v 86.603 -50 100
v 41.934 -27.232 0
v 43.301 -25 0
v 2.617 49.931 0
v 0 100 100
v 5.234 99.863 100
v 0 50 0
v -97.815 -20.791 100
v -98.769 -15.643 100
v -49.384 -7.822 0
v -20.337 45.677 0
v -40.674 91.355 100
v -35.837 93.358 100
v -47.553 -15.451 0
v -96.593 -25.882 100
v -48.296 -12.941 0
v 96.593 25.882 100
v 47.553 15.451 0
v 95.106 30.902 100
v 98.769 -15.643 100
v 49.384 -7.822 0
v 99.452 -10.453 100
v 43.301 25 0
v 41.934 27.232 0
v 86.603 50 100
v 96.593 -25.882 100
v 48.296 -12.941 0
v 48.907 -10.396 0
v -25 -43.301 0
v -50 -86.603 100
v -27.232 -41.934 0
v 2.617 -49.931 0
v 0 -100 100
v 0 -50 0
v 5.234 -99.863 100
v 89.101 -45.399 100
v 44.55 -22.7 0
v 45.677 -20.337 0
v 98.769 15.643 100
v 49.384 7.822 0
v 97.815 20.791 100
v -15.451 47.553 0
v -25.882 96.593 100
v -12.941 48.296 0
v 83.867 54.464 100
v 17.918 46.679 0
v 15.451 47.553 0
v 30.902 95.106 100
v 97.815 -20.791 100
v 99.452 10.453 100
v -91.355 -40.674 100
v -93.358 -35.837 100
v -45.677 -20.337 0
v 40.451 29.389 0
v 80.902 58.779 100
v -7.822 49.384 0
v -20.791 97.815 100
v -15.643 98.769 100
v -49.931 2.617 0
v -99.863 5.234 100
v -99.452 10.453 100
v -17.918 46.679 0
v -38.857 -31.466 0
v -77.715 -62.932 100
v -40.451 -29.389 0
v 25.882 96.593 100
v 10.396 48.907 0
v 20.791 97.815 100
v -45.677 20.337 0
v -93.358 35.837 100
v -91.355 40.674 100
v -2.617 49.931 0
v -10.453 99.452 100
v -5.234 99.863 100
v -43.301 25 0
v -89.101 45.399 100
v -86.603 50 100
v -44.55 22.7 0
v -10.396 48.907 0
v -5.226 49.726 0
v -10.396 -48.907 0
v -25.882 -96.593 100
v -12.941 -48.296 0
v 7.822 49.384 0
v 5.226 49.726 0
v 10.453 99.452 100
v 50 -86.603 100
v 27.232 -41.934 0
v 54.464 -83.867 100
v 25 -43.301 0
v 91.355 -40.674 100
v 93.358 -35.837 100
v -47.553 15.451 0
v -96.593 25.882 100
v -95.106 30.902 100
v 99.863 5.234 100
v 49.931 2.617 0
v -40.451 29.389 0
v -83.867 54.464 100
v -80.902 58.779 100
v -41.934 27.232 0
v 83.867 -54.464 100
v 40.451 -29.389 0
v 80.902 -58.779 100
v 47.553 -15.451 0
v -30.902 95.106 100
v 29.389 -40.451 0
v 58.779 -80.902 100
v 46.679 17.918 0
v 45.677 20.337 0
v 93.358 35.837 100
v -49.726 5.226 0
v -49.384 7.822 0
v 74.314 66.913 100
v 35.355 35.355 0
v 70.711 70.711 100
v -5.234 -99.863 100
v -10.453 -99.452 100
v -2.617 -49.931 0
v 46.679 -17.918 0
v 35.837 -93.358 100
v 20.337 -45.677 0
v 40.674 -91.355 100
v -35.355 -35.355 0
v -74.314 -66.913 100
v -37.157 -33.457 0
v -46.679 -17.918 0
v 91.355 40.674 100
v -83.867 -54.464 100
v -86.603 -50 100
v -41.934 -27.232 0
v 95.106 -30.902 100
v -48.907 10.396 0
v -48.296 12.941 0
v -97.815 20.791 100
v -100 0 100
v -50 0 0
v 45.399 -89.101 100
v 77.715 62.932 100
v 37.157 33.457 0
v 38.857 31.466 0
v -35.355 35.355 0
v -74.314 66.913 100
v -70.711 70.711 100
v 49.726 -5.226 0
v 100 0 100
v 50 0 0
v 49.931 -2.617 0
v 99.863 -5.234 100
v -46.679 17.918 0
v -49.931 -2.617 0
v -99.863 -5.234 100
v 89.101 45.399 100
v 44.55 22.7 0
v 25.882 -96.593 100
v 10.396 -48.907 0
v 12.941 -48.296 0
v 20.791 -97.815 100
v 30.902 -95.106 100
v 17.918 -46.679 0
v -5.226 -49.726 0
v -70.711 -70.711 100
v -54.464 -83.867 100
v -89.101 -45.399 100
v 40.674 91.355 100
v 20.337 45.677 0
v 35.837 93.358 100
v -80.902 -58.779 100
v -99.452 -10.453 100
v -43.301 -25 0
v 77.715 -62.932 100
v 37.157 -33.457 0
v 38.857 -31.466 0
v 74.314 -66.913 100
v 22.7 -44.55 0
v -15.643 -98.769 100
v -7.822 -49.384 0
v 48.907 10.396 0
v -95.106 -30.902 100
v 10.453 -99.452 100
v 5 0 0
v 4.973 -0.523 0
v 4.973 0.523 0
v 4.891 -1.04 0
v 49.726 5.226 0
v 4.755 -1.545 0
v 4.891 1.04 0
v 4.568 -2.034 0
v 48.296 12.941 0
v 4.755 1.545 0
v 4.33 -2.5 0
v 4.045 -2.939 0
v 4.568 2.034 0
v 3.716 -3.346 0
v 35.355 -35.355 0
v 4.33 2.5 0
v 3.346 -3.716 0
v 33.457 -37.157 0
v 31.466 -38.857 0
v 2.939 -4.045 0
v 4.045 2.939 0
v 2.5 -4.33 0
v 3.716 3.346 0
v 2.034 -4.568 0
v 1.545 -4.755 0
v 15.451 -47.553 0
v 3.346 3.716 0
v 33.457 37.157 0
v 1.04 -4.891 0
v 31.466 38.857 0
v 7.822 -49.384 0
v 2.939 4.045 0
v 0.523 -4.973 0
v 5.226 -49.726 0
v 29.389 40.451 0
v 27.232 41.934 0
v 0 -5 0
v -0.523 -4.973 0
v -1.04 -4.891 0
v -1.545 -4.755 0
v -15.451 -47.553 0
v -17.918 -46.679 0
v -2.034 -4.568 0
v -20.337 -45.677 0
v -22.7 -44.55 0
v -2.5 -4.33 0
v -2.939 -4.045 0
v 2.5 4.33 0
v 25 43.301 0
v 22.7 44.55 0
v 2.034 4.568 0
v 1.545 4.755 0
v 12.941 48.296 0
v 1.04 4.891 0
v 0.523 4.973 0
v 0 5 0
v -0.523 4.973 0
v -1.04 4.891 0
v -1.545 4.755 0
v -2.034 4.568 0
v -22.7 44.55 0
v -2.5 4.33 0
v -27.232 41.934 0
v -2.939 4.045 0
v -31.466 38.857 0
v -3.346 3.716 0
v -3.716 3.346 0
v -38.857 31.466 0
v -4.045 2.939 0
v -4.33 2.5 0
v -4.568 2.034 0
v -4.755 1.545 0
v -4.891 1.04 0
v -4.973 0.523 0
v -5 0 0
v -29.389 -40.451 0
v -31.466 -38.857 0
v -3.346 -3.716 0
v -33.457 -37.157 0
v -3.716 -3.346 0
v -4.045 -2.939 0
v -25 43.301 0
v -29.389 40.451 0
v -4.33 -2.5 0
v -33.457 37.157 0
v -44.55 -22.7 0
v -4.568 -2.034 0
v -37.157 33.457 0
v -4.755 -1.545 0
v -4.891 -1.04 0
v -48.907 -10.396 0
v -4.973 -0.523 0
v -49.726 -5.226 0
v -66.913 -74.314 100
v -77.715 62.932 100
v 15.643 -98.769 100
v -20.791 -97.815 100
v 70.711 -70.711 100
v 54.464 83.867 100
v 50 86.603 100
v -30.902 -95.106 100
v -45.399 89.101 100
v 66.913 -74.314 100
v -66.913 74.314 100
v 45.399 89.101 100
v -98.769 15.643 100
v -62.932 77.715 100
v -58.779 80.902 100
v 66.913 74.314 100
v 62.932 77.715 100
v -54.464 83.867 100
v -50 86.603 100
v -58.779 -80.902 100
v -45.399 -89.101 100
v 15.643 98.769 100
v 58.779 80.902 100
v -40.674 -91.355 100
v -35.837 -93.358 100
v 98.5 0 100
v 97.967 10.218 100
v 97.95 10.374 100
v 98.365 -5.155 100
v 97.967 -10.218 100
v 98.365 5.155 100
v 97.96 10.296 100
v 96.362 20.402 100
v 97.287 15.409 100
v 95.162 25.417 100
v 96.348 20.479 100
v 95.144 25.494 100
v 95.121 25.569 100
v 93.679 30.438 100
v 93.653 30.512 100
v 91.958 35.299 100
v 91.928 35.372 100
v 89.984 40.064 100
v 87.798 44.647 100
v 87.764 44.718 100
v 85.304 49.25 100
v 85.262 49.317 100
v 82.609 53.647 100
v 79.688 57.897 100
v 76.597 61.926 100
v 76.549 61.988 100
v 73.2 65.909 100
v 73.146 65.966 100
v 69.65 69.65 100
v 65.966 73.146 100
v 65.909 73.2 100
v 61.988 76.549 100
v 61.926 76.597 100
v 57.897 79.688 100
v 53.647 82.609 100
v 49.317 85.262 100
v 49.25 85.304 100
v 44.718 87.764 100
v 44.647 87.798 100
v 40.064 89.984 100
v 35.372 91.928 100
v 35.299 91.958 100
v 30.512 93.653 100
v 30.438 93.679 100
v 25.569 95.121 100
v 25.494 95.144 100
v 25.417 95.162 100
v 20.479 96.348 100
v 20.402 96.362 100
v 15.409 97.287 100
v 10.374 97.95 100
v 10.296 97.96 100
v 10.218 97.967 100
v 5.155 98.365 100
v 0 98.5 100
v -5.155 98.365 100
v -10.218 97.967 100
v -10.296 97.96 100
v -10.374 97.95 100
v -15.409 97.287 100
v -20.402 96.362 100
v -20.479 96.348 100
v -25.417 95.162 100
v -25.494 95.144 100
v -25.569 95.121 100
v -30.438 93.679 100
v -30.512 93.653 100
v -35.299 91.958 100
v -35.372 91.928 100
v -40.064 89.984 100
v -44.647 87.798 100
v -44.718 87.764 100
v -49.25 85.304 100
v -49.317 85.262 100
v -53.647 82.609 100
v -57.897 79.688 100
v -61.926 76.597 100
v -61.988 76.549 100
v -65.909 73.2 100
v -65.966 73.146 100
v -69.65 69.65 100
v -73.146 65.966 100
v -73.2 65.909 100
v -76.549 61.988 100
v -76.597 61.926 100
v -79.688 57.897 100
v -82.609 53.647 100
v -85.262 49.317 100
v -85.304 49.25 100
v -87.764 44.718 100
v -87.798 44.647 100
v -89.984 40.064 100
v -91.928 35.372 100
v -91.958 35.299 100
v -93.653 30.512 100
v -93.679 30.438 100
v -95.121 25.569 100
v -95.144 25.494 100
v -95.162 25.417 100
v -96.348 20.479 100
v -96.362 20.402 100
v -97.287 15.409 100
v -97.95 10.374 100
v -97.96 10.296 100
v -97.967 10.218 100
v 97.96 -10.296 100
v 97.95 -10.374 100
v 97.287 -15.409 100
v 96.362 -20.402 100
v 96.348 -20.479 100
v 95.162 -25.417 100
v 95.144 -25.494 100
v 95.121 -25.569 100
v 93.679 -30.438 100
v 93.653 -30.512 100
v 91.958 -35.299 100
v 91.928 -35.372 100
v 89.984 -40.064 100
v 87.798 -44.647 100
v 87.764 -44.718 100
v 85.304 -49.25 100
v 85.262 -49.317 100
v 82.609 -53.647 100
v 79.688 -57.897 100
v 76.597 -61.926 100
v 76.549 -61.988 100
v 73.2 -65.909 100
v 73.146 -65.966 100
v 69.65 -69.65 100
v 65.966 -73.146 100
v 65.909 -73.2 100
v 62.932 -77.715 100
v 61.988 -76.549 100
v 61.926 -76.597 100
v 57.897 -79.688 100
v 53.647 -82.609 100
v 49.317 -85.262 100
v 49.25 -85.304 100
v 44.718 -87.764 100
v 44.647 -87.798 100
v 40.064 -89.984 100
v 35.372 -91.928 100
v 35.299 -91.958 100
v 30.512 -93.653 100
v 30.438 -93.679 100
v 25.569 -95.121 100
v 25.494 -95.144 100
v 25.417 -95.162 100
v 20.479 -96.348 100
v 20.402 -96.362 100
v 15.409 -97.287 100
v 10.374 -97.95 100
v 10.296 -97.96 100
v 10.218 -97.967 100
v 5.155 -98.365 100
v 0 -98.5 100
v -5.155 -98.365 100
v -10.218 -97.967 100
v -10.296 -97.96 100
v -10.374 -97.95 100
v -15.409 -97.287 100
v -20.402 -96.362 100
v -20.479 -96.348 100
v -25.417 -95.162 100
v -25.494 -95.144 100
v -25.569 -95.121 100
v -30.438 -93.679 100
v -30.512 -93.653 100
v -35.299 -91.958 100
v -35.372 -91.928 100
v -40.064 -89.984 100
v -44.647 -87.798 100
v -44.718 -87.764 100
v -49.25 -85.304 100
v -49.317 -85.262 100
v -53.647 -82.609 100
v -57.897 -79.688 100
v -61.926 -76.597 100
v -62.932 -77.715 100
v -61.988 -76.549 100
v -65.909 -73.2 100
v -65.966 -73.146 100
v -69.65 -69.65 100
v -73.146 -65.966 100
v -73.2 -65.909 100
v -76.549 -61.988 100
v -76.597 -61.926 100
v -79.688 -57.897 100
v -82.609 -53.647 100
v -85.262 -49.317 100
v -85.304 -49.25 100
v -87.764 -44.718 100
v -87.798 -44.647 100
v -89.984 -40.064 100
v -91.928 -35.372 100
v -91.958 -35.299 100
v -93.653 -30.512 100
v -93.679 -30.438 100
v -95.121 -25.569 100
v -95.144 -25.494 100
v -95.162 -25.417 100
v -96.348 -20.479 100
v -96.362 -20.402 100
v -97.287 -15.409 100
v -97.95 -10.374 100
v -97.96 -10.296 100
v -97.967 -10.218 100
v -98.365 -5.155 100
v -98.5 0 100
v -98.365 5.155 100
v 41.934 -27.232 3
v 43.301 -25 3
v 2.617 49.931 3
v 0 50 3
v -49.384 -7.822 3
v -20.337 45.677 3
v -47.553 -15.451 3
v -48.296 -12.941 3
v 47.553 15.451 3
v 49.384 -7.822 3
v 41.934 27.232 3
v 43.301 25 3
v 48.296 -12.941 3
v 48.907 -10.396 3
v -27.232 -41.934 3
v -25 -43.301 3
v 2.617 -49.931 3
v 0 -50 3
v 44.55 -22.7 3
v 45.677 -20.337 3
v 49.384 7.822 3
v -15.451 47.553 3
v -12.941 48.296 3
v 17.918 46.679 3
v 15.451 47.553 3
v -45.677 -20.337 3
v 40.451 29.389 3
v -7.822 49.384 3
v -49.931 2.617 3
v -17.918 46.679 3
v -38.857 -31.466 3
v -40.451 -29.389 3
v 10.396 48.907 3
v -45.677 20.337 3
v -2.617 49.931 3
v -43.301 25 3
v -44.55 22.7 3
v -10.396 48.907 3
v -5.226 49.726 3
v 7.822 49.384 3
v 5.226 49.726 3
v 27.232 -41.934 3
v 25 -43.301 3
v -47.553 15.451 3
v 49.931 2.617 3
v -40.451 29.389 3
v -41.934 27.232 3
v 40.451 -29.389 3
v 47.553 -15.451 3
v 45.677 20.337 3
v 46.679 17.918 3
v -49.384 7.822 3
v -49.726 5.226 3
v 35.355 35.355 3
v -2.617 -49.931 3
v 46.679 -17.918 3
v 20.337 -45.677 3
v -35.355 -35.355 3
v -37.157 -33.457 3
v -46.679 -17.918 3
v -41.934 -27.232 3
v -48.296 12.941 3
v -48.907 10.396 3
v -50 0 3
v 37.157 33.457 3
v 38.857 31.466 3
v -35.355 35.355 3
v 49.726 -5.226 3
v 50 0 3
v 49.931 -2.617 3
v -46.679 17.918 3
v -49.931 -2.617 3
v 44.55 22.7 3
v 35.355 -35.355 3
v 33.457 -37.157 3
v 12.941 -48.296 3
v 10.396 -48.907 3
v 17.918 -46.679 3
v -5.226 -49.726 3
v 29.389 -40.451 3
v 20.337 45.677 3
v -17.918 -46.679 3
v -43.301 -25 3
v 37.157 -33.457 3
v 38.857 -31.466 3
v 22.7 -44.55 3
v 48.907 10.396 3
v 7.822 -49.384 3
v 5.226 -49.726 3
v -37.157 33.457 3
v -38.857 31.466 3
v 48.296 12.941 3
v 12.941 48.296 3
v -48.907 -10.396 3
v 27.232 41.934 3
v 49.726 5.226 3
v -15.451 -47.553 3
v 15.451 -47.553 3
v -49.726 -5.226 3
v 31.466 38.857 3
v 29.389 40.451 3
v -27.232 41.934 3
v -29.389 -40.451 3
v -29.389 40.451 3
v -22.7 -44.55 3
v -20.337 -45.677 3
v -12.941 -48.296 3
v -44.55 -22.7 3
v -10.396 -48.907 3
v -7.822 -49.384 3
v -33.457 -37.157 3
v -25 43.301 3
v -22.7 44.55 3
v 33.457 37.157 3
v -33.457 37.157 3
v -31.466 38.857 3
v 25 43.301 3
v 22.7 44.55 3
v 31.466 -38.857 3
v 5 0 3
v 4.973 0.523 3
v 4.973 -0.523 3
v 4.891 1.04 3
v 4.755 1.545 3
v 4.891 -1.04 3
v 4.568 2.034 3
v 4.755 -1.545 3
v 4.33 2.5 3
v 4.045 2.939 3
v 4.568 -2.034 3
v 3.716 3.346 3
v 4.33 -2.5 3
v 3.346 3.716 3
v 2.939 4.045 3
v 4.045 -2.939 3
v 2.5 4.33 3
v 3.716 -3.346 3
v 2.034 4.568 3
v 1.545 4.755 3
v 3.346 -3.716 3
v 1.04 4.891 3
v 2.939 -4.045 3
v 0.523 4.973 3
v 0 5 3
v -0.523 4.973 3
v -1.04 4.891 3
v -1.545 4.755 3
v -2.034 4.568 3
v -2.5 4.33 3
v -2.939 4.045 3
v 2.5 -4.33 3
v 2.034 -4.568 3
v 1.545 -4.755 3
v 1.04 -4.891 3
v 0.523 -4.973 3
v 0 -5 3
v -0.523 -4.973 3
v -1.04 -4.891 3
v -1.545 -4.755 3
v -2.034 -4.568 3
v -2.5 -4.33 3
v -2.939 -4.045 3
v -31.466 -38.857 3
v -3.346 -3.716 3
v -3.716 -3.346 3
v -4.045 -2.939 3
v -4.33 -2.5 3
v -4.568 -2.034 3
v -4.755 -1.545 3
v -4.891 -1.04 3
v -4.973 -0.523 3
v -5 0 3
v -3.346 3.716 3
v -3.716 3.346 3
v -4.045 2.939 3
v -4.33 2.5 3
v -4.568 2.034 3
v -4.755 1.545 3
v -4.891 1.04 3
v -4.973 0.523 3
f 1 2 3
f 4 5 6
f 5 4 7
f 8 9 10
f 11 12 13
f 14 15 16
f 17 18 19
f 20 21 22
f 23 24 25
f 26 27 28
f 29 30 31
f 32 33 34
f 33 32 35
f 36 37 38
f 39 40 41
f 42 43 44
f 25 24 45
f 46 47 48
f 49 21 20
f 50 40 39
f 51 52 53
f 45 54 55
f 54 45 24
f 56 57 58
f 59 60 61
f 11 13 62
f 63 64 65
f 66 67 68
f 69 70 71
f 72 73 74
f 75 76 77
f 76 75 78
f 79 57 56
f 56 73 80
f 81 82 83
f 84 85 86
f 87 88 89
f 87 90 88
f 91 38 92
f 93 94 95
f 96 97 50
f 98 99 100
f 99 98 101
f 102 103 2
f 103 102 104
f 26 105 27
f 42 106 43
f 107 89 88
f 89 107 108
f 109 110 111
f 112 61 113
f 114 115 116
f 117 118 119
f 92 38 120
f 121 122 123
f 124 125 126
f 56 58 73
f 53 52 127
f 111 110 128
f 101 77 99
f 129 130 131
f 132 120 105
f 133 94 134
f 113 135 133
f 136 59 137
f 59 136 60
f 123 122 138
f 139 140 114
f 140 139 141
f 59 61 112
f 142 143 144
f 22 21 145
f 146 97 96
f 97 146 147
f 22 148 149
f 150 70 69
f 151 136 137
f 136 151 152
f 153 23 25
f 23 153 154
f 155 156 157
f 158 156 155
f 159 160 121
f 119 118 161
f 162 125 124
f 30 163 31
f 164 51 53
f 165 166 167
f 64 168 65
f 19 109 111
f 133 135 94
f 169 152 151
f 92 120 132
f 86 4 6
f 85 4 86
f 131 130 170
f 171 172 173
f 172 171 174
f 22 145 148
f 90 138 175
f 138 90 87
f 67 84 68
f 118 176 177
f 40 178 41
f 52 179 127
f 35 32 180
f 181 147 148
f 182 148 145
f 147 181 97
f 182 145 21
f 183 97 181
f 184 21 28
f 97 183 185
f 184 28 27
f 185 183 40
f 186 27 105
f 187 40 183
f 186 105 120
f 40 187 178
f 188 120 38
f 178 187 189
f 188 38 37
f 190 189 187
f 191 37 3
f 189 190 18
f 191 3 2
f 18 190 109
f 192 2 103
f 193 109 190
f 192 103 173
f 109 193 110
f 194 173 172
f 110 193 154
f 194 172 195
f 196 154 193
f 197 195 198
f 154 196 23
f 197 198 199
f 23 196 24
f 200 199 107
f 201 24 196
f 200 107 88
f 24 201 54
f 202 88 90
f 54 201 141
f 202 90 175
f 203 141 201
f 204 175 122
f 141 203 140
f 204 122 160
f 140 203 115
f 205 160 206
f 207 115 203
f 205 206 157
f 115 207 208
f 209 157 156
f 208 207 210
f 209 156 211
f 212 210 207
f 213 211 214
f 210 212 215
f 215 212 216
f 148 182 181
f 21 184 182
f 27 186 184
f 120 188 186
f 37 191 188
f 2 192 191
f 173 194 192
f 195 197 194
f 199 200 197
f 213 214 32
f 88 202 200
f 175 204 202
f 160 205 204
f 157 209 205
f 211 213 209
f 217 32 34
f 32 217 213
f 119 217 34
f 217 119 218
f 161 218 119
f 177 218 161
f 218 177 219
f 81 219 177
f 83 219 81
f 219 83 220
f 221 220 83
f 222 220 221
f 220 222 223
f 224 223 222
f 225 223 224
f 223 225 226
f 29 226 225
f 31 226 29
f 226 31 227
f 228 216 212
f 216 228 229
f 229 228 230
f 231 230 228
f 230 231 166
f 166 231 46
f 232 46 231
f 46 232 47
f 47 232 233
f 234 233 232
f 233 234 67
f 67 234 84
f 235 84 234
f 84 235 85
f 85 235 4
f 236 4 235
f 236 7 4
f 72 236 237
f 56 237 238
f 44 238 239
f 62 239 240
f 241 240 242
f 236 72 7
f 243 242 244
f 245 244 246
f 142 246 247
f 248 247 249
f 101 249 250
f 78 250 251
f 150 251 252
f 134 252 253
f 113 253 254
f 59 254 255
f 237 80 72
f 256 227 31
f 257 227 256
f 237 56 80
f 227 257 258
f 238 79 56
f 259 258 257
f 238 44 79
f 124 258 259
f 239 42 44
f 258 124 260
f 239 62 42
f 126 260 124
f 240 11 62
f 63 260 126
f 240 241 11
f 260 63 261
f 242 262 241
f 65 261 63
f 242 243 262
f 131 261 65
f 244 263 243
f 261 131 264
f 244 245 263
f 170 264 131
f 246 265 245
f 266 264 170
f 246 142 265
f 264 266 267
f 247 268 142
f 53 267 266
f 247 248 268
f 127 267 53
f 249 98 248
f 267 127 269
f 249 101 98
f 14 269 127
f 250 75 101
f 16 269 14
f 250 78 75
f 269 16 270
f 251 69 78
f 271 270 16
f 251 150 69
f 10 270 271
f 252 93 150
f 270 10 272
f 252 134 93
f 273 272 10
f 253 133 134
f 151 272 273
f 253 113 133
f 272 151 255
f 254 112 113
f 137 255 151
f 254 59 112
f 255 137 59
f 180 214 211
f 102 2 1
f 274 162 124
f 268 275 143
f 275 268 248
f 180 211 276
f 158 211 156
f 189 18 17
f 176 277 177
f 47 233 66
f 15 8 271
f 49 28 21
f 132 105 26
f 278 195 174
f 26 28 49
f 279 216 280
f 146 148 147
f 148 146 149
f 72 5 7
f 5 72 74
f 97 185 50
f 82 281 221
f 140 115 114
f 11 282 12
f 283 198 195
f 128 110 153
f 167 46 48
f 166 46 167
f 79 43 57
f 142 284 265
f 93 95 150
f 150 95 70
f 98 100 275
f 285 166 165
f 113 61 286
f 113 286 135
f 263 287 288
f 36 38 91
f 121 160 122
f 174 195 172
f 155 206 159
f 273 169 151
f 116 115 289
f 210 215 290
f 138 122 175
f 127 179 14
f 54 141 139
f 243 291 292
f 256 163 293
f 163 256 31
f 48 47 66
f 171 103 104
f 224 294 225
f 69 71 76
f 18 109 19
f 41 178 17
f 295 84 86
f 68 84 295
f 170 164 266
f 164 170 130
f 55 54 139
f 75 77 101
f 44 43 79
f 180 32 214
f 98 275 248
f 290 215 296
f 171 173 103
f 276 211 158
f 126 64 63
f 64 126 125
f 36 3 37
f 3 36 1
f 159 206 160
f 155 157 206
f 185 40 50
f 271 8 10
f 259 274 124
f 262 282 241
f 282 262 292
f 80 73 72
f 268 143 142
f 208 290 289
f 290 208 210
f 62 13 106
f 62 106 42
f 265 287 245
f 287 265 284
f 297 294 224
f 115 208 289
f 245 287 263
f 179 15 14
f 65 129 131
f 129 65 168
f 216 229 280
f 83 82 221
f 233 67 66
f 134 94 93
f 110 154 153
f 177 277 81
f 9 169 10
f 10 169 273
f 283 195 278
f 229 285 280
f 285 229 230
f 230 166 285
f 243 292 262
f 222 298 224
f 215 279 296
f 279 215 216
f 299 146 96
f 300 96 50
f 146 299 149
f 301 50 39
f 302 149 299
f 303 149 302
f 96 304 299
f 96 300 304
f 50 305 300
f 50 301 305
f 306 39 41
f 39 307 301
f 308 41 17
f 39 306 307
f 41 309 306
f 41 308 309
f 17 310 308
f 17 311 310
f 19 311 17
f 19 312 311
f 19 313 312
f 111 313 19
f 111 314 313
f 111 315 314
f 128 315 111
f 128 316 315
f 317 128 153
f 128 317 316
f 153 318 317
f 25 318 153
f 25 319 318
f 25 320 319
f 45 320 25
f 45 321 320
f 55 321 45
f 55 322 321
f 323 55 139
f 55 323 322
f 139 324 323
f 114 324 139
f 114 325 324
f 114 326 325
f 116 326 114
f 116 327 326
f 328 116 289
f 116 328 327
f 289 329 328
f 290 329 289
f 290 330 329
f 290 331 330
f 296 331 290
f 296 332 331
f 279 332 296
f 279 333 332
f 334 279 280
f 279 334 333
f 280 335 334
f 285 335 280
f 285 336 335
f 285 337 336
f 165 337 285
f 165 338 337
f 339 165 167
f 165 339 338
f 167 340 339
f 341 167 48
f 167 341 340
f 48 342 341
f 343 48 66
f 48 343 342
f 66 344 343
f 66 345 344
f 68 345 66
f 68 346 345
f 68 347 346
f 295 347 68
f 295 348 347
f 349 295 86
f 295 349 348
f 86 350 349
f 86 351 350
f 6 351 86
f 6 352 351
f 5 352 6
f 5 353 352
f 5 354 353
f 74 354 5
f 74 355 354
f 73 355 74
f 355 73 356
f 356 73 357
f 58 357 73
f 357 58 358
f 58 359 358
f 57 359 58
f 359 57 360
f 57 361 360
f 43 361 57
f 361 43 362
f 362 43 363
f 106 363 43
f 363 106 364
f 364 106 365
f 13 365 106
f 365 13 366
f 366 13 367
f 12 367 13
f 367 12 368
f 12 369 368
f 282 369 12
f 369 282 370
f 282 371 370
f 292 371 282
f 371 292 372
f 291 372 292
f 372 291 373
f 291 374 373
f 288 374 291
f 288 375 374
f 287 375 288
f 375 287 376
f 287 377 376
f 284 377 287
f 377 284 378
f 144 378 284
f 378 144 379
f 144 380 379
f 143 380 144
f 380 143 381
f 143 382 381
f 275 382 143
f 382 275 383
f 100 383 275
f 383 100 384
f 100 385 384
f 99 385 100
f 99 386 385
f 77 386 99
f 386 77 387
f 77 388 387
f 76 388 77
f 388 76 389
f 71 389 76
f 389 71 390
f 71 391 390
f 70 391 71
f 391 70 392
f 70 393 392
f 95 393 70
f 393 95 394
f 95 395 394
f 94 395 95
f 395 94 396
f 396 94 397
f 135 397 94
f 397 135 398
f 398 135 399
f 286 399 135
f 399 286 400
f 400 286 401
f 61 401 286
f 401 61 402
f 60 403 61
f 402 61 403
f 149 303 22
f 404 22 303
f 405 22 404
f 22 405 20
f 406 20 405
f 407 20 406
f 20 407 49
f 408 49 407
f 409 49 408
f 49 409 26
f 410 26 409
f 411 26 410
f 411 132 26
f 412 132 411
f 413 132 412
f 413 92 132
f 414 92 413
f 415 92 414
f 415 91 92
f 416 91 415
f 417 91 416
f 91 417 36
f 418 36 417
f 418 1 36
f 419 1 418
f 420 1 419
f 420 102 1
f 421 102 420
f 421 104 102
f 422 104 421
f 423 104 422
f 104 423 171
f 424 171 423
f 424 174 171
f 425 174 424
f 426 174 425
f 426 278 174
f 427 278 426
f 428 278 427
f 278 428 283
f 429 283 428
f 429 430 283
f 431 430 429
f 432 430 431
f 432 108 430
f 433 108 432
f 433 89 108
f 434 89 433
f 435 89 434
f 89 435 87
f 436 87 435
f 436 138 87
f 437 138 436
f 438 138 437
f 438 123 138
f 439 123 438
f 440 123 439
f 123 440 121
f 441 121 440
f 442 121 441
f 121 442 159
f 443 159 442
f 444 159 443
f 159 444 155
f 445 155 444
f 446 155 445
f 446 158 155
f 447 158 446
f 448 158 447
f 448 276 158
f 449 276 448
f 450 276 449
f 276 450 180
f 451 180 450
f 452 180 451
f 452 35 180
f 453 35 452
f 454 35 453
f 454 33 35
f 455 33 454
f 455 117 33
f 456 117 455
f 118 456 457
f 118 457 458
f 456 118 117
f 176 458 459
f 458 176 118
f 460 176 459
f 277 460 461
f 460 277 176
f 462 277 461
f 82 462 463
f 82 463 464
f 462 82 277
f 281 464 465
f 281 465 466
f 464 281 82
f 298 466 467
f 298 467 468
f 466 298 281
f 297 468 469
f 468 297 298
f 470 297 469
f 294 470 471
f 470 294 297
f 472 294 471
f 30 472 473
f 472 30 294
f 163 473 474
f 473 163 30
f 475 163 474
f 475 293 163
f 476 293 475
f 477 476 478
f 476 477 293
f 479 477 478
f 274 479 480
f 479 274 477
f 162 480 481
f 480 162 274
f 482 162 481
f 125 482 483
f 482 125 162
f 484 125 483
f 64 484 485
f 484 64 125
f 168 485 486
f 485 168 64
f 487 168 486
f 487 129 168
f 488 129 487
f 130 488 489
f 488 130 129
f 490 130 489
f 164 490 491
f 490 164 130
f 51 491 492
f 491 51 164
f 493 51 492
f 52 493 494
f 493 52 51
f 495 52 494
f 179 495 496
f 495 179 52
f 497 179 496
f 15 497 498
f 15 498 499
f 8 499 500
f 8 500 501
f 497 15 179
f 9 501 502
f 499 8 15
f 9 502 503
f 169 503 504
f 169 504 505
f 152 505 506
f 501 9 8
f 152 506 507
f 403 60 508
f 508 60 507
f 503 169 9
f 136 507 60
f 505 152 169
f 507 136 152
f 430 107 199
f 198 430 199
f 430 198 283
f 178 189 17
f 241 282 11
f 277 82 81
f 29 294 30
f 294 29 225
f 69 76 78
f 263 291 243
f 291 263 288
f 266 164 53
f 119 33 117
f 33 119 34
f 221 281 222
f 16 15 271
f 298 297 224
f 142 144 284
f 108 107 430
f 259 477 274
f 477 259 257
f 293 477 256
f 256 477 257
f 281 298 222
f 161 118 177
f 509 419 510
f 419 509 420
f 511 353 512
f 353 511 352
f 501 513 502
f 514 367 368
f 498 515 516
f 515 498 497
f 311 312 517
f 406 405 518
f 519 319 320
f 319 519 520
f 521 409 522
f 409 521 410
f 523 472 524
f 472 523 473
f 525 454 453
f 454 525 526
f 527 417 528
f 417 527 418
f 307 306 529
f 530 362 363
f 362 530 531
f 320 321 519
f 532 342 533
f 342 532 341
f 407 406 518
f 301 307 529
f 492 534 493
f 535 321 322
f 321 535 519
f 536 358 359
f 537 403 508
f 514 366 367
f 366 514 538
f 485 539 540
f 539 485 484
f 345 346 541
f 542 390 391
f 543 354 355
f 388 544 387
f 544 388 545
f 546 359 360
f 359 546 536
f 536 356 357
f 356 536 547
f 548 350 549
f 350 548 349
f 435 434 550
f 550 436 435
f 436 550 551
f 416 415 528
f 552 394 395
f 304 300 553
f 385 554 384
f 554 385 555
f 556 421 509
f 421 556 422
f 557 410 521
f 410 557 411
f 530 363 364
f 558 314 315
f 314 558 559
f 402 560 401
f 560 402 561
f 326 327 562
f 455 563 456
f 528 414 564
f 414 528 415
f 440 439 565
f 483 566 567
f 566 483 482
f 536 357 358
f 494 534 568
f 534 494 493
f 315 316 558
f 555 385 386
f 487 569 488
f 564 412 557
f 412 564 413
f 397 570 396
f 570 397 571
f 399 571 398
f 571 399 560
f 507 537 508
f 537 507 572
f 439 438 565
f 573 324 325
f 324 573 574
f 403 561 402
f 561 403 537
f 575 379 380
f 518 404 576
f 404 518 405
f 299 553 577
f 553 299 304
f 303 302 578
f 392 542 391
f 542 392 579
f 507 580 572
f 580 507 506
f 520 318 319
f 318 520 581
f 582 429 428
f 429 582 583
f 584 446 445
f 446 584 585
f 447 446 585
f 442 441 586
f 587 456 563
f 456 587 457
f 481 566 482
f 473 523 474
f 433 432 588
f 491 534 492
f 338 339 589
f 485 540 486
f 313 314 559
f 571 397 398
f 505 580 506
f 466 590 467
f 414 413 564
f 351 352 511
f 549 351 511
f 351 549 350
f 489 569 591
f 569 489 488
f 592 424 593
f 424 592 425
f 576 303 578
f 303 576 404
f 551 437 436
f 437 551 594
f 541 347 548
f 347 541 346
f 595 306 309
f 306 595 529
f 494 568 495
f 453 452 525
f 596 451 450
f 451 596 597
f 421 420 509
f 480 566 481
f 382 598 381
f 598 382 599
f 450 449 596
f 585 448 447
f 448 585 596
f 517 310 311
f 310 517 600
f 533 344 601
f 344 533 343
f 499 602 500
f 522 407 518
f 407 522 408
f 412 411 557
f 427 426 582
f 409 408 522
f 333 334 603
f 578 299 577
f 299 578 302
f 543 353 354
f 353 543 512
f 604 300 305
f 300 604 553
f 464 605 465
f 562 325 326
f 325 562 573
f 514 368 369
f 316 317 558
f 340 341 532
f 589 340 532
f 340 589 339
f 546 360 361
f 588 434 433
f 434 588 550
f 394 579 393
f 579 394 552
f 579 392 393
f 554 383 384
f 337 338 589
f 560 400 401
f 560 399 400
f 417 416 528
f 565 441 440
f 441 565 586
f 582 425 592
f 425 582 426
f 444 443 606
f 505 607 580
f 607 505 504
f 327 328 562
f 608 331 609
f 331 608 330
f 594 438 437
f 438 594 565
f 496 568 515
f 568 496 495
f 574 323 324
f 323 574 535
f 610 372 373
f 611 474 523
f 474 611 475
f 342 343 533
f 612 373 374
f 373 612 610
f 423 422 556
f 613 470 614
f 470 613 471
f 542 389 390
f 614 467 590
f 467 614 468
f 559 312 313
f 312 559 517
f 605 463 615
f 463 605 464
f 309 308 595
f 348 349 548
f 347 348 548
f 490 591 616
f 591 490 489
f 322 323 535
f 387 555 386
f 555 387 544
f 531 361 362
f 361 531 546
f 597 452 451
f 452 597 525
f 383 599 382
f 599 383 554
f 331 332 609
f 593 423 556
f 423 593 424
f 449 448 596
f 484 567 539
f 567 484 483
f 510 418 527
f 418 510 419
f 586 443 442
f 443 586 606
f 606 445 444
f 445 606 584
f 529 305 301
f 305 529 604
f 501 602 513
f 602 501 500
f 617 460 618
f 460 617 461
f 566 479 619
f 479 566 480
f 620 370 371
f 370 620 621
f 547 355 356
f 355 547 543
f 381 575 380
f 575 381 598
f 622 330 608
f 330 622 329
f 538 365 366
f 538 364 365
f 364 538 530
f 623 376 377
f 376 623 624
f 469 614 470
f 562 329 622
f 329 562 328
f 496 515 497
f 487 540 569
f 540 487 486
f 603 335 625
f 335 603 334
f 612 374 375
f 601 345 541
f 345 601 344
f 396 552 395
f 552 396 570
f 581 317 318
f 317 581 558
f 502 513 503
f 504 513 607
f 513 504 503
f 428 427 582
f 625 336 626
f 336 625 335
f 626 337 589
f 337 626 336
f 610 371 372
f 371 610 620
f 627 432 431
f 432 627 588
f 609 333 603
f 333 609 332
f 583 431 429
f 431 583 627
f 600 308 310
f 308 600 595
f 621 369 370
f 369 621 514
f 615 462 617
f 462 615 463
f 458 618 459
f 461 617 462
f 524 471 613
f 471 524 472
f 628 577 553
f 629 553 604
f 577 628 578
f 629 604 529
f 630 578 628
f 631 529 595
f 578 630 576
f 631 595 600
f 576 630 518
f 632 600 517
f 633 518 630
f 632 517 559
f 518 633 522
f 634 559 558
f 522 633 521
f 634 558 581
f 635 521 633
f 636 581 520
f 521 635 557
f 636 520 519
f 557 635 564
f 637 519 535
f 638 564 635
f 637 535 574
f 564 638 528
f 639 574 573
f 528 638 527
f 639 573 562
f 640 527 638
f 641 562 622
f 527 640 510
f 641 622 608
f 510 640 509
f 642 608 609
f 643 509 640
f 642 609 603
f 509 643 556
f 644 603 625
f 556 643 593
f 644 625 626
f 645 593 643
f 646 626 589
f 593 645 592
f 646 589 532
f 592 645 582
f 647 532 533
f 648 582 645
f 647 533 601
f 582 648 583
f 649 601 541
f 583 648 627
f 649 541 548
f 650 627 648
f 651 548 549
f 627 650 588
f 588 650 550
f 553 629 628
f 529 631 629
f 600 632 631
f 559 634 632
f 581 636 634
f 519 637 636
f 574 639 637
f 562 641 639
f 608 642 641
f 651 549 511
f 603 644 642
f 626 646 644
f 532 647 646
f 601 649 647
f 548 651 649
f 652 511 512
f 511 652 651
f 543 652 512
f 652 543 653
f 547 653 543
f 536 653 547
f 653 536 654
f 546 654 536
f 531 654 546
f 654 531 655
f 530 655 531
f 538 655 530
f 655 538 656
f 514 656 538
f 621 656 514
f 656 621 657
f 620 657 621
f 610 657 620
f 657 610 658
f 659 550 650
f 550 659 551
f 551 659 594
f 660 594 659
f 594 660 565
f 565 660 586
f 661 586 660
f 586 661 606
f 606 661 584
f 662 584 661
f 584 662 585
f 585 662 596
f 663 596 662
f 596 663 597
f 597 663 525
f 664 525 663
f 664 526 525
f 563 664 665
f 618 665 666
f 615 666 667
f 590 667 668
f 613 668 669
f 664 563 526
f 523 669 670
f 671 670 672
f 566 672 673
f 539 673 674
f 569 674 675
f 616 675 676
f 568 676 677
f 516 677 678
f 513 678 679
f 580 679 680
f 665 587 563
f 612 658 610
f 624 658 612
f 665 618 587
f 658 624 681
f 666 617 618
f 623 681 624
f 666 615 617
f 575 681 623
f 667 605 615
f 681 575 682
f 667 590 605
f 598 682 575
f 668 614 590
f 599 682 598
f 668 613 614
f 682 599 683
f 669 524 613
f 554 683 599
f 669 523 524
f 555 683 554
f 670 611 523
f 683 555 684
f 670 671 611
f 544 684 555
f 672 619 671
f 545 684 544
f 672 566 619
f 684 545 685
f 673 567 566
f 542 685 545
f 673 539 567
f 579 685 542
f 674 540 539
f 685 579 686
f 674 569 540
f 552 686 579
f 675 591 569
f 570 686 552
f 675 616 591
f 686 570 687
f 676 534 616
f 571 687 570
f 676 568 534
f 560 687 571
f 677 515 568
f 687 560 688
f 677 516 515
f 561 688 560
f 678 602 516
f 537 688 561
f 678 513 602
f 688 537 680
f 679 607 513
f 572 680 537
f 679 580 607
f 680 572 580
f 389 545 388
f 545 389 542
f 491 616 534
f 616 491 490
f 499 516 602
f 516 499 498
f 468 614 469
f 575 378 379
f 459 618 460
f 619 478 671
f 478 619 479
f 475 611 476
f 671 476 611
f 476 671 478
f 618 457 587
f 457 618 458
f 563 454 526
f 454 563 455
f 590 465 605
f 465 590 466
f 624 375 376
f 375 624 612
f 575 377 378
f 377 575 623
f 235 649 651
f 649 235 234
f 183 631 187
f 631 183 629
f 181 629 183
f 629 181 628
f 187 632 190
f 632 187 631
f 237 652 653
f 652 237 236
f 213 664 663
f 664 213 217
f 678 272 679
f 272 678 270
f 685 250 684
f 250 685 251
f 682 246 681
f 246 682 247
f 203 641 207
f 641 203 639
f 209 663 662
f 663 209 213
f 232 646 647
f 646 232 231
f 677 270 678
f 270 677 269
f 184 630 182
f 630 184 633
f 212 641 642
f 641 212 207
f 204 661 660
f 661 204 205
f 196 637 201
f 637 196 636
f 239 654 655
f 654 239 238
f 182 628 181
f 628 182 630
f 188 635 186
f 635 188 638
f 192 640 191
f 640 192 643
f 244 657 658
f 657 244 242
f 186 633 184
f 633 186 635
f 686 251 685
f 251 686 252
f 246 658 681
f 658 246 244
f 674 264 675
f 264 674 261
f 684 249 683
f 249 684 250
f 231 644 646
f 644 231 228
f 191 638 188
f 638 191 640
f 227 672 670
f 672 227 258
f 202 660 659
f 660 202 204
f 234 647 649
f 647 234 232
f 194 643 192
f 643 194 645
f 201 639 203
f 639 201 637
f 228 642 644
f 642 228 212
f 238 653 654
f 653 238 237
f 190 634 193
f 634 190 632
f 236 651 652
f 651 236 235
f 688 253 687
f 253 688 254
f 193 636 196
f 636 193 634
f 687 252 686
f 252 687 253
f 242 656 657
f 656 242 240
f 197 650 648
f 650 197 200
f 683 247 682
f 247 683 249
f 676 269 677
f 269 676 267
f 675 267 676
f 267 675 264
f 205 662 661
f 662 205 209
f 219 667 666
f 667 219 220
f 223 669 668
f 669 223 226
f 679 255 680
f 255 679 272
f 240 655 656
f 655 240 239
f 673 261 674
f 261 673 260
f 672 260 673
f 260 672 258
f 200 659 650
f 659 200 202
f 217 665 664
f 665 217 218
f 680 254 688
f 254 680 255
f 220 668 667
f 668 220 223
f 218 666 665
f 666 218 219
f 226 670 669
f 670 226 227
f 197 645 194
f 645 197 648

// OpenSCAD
// lamp diffuser Jim Dodgen 2022

top_d = 200;
bottom_d = 100;
height = 100;
wall = 3;
hole=10;


difference()
{	
	color("red")	
		cylinder(d2=top_d, d1=bottom_d, h=height, $fn=120);		
	translate([0,0,wall]) 
		cylinder(d2=top_d, d1=bottom_d, h=height, $fn=120);
	cylinder(d=hole, h=wall, $fn=60);
}
	
